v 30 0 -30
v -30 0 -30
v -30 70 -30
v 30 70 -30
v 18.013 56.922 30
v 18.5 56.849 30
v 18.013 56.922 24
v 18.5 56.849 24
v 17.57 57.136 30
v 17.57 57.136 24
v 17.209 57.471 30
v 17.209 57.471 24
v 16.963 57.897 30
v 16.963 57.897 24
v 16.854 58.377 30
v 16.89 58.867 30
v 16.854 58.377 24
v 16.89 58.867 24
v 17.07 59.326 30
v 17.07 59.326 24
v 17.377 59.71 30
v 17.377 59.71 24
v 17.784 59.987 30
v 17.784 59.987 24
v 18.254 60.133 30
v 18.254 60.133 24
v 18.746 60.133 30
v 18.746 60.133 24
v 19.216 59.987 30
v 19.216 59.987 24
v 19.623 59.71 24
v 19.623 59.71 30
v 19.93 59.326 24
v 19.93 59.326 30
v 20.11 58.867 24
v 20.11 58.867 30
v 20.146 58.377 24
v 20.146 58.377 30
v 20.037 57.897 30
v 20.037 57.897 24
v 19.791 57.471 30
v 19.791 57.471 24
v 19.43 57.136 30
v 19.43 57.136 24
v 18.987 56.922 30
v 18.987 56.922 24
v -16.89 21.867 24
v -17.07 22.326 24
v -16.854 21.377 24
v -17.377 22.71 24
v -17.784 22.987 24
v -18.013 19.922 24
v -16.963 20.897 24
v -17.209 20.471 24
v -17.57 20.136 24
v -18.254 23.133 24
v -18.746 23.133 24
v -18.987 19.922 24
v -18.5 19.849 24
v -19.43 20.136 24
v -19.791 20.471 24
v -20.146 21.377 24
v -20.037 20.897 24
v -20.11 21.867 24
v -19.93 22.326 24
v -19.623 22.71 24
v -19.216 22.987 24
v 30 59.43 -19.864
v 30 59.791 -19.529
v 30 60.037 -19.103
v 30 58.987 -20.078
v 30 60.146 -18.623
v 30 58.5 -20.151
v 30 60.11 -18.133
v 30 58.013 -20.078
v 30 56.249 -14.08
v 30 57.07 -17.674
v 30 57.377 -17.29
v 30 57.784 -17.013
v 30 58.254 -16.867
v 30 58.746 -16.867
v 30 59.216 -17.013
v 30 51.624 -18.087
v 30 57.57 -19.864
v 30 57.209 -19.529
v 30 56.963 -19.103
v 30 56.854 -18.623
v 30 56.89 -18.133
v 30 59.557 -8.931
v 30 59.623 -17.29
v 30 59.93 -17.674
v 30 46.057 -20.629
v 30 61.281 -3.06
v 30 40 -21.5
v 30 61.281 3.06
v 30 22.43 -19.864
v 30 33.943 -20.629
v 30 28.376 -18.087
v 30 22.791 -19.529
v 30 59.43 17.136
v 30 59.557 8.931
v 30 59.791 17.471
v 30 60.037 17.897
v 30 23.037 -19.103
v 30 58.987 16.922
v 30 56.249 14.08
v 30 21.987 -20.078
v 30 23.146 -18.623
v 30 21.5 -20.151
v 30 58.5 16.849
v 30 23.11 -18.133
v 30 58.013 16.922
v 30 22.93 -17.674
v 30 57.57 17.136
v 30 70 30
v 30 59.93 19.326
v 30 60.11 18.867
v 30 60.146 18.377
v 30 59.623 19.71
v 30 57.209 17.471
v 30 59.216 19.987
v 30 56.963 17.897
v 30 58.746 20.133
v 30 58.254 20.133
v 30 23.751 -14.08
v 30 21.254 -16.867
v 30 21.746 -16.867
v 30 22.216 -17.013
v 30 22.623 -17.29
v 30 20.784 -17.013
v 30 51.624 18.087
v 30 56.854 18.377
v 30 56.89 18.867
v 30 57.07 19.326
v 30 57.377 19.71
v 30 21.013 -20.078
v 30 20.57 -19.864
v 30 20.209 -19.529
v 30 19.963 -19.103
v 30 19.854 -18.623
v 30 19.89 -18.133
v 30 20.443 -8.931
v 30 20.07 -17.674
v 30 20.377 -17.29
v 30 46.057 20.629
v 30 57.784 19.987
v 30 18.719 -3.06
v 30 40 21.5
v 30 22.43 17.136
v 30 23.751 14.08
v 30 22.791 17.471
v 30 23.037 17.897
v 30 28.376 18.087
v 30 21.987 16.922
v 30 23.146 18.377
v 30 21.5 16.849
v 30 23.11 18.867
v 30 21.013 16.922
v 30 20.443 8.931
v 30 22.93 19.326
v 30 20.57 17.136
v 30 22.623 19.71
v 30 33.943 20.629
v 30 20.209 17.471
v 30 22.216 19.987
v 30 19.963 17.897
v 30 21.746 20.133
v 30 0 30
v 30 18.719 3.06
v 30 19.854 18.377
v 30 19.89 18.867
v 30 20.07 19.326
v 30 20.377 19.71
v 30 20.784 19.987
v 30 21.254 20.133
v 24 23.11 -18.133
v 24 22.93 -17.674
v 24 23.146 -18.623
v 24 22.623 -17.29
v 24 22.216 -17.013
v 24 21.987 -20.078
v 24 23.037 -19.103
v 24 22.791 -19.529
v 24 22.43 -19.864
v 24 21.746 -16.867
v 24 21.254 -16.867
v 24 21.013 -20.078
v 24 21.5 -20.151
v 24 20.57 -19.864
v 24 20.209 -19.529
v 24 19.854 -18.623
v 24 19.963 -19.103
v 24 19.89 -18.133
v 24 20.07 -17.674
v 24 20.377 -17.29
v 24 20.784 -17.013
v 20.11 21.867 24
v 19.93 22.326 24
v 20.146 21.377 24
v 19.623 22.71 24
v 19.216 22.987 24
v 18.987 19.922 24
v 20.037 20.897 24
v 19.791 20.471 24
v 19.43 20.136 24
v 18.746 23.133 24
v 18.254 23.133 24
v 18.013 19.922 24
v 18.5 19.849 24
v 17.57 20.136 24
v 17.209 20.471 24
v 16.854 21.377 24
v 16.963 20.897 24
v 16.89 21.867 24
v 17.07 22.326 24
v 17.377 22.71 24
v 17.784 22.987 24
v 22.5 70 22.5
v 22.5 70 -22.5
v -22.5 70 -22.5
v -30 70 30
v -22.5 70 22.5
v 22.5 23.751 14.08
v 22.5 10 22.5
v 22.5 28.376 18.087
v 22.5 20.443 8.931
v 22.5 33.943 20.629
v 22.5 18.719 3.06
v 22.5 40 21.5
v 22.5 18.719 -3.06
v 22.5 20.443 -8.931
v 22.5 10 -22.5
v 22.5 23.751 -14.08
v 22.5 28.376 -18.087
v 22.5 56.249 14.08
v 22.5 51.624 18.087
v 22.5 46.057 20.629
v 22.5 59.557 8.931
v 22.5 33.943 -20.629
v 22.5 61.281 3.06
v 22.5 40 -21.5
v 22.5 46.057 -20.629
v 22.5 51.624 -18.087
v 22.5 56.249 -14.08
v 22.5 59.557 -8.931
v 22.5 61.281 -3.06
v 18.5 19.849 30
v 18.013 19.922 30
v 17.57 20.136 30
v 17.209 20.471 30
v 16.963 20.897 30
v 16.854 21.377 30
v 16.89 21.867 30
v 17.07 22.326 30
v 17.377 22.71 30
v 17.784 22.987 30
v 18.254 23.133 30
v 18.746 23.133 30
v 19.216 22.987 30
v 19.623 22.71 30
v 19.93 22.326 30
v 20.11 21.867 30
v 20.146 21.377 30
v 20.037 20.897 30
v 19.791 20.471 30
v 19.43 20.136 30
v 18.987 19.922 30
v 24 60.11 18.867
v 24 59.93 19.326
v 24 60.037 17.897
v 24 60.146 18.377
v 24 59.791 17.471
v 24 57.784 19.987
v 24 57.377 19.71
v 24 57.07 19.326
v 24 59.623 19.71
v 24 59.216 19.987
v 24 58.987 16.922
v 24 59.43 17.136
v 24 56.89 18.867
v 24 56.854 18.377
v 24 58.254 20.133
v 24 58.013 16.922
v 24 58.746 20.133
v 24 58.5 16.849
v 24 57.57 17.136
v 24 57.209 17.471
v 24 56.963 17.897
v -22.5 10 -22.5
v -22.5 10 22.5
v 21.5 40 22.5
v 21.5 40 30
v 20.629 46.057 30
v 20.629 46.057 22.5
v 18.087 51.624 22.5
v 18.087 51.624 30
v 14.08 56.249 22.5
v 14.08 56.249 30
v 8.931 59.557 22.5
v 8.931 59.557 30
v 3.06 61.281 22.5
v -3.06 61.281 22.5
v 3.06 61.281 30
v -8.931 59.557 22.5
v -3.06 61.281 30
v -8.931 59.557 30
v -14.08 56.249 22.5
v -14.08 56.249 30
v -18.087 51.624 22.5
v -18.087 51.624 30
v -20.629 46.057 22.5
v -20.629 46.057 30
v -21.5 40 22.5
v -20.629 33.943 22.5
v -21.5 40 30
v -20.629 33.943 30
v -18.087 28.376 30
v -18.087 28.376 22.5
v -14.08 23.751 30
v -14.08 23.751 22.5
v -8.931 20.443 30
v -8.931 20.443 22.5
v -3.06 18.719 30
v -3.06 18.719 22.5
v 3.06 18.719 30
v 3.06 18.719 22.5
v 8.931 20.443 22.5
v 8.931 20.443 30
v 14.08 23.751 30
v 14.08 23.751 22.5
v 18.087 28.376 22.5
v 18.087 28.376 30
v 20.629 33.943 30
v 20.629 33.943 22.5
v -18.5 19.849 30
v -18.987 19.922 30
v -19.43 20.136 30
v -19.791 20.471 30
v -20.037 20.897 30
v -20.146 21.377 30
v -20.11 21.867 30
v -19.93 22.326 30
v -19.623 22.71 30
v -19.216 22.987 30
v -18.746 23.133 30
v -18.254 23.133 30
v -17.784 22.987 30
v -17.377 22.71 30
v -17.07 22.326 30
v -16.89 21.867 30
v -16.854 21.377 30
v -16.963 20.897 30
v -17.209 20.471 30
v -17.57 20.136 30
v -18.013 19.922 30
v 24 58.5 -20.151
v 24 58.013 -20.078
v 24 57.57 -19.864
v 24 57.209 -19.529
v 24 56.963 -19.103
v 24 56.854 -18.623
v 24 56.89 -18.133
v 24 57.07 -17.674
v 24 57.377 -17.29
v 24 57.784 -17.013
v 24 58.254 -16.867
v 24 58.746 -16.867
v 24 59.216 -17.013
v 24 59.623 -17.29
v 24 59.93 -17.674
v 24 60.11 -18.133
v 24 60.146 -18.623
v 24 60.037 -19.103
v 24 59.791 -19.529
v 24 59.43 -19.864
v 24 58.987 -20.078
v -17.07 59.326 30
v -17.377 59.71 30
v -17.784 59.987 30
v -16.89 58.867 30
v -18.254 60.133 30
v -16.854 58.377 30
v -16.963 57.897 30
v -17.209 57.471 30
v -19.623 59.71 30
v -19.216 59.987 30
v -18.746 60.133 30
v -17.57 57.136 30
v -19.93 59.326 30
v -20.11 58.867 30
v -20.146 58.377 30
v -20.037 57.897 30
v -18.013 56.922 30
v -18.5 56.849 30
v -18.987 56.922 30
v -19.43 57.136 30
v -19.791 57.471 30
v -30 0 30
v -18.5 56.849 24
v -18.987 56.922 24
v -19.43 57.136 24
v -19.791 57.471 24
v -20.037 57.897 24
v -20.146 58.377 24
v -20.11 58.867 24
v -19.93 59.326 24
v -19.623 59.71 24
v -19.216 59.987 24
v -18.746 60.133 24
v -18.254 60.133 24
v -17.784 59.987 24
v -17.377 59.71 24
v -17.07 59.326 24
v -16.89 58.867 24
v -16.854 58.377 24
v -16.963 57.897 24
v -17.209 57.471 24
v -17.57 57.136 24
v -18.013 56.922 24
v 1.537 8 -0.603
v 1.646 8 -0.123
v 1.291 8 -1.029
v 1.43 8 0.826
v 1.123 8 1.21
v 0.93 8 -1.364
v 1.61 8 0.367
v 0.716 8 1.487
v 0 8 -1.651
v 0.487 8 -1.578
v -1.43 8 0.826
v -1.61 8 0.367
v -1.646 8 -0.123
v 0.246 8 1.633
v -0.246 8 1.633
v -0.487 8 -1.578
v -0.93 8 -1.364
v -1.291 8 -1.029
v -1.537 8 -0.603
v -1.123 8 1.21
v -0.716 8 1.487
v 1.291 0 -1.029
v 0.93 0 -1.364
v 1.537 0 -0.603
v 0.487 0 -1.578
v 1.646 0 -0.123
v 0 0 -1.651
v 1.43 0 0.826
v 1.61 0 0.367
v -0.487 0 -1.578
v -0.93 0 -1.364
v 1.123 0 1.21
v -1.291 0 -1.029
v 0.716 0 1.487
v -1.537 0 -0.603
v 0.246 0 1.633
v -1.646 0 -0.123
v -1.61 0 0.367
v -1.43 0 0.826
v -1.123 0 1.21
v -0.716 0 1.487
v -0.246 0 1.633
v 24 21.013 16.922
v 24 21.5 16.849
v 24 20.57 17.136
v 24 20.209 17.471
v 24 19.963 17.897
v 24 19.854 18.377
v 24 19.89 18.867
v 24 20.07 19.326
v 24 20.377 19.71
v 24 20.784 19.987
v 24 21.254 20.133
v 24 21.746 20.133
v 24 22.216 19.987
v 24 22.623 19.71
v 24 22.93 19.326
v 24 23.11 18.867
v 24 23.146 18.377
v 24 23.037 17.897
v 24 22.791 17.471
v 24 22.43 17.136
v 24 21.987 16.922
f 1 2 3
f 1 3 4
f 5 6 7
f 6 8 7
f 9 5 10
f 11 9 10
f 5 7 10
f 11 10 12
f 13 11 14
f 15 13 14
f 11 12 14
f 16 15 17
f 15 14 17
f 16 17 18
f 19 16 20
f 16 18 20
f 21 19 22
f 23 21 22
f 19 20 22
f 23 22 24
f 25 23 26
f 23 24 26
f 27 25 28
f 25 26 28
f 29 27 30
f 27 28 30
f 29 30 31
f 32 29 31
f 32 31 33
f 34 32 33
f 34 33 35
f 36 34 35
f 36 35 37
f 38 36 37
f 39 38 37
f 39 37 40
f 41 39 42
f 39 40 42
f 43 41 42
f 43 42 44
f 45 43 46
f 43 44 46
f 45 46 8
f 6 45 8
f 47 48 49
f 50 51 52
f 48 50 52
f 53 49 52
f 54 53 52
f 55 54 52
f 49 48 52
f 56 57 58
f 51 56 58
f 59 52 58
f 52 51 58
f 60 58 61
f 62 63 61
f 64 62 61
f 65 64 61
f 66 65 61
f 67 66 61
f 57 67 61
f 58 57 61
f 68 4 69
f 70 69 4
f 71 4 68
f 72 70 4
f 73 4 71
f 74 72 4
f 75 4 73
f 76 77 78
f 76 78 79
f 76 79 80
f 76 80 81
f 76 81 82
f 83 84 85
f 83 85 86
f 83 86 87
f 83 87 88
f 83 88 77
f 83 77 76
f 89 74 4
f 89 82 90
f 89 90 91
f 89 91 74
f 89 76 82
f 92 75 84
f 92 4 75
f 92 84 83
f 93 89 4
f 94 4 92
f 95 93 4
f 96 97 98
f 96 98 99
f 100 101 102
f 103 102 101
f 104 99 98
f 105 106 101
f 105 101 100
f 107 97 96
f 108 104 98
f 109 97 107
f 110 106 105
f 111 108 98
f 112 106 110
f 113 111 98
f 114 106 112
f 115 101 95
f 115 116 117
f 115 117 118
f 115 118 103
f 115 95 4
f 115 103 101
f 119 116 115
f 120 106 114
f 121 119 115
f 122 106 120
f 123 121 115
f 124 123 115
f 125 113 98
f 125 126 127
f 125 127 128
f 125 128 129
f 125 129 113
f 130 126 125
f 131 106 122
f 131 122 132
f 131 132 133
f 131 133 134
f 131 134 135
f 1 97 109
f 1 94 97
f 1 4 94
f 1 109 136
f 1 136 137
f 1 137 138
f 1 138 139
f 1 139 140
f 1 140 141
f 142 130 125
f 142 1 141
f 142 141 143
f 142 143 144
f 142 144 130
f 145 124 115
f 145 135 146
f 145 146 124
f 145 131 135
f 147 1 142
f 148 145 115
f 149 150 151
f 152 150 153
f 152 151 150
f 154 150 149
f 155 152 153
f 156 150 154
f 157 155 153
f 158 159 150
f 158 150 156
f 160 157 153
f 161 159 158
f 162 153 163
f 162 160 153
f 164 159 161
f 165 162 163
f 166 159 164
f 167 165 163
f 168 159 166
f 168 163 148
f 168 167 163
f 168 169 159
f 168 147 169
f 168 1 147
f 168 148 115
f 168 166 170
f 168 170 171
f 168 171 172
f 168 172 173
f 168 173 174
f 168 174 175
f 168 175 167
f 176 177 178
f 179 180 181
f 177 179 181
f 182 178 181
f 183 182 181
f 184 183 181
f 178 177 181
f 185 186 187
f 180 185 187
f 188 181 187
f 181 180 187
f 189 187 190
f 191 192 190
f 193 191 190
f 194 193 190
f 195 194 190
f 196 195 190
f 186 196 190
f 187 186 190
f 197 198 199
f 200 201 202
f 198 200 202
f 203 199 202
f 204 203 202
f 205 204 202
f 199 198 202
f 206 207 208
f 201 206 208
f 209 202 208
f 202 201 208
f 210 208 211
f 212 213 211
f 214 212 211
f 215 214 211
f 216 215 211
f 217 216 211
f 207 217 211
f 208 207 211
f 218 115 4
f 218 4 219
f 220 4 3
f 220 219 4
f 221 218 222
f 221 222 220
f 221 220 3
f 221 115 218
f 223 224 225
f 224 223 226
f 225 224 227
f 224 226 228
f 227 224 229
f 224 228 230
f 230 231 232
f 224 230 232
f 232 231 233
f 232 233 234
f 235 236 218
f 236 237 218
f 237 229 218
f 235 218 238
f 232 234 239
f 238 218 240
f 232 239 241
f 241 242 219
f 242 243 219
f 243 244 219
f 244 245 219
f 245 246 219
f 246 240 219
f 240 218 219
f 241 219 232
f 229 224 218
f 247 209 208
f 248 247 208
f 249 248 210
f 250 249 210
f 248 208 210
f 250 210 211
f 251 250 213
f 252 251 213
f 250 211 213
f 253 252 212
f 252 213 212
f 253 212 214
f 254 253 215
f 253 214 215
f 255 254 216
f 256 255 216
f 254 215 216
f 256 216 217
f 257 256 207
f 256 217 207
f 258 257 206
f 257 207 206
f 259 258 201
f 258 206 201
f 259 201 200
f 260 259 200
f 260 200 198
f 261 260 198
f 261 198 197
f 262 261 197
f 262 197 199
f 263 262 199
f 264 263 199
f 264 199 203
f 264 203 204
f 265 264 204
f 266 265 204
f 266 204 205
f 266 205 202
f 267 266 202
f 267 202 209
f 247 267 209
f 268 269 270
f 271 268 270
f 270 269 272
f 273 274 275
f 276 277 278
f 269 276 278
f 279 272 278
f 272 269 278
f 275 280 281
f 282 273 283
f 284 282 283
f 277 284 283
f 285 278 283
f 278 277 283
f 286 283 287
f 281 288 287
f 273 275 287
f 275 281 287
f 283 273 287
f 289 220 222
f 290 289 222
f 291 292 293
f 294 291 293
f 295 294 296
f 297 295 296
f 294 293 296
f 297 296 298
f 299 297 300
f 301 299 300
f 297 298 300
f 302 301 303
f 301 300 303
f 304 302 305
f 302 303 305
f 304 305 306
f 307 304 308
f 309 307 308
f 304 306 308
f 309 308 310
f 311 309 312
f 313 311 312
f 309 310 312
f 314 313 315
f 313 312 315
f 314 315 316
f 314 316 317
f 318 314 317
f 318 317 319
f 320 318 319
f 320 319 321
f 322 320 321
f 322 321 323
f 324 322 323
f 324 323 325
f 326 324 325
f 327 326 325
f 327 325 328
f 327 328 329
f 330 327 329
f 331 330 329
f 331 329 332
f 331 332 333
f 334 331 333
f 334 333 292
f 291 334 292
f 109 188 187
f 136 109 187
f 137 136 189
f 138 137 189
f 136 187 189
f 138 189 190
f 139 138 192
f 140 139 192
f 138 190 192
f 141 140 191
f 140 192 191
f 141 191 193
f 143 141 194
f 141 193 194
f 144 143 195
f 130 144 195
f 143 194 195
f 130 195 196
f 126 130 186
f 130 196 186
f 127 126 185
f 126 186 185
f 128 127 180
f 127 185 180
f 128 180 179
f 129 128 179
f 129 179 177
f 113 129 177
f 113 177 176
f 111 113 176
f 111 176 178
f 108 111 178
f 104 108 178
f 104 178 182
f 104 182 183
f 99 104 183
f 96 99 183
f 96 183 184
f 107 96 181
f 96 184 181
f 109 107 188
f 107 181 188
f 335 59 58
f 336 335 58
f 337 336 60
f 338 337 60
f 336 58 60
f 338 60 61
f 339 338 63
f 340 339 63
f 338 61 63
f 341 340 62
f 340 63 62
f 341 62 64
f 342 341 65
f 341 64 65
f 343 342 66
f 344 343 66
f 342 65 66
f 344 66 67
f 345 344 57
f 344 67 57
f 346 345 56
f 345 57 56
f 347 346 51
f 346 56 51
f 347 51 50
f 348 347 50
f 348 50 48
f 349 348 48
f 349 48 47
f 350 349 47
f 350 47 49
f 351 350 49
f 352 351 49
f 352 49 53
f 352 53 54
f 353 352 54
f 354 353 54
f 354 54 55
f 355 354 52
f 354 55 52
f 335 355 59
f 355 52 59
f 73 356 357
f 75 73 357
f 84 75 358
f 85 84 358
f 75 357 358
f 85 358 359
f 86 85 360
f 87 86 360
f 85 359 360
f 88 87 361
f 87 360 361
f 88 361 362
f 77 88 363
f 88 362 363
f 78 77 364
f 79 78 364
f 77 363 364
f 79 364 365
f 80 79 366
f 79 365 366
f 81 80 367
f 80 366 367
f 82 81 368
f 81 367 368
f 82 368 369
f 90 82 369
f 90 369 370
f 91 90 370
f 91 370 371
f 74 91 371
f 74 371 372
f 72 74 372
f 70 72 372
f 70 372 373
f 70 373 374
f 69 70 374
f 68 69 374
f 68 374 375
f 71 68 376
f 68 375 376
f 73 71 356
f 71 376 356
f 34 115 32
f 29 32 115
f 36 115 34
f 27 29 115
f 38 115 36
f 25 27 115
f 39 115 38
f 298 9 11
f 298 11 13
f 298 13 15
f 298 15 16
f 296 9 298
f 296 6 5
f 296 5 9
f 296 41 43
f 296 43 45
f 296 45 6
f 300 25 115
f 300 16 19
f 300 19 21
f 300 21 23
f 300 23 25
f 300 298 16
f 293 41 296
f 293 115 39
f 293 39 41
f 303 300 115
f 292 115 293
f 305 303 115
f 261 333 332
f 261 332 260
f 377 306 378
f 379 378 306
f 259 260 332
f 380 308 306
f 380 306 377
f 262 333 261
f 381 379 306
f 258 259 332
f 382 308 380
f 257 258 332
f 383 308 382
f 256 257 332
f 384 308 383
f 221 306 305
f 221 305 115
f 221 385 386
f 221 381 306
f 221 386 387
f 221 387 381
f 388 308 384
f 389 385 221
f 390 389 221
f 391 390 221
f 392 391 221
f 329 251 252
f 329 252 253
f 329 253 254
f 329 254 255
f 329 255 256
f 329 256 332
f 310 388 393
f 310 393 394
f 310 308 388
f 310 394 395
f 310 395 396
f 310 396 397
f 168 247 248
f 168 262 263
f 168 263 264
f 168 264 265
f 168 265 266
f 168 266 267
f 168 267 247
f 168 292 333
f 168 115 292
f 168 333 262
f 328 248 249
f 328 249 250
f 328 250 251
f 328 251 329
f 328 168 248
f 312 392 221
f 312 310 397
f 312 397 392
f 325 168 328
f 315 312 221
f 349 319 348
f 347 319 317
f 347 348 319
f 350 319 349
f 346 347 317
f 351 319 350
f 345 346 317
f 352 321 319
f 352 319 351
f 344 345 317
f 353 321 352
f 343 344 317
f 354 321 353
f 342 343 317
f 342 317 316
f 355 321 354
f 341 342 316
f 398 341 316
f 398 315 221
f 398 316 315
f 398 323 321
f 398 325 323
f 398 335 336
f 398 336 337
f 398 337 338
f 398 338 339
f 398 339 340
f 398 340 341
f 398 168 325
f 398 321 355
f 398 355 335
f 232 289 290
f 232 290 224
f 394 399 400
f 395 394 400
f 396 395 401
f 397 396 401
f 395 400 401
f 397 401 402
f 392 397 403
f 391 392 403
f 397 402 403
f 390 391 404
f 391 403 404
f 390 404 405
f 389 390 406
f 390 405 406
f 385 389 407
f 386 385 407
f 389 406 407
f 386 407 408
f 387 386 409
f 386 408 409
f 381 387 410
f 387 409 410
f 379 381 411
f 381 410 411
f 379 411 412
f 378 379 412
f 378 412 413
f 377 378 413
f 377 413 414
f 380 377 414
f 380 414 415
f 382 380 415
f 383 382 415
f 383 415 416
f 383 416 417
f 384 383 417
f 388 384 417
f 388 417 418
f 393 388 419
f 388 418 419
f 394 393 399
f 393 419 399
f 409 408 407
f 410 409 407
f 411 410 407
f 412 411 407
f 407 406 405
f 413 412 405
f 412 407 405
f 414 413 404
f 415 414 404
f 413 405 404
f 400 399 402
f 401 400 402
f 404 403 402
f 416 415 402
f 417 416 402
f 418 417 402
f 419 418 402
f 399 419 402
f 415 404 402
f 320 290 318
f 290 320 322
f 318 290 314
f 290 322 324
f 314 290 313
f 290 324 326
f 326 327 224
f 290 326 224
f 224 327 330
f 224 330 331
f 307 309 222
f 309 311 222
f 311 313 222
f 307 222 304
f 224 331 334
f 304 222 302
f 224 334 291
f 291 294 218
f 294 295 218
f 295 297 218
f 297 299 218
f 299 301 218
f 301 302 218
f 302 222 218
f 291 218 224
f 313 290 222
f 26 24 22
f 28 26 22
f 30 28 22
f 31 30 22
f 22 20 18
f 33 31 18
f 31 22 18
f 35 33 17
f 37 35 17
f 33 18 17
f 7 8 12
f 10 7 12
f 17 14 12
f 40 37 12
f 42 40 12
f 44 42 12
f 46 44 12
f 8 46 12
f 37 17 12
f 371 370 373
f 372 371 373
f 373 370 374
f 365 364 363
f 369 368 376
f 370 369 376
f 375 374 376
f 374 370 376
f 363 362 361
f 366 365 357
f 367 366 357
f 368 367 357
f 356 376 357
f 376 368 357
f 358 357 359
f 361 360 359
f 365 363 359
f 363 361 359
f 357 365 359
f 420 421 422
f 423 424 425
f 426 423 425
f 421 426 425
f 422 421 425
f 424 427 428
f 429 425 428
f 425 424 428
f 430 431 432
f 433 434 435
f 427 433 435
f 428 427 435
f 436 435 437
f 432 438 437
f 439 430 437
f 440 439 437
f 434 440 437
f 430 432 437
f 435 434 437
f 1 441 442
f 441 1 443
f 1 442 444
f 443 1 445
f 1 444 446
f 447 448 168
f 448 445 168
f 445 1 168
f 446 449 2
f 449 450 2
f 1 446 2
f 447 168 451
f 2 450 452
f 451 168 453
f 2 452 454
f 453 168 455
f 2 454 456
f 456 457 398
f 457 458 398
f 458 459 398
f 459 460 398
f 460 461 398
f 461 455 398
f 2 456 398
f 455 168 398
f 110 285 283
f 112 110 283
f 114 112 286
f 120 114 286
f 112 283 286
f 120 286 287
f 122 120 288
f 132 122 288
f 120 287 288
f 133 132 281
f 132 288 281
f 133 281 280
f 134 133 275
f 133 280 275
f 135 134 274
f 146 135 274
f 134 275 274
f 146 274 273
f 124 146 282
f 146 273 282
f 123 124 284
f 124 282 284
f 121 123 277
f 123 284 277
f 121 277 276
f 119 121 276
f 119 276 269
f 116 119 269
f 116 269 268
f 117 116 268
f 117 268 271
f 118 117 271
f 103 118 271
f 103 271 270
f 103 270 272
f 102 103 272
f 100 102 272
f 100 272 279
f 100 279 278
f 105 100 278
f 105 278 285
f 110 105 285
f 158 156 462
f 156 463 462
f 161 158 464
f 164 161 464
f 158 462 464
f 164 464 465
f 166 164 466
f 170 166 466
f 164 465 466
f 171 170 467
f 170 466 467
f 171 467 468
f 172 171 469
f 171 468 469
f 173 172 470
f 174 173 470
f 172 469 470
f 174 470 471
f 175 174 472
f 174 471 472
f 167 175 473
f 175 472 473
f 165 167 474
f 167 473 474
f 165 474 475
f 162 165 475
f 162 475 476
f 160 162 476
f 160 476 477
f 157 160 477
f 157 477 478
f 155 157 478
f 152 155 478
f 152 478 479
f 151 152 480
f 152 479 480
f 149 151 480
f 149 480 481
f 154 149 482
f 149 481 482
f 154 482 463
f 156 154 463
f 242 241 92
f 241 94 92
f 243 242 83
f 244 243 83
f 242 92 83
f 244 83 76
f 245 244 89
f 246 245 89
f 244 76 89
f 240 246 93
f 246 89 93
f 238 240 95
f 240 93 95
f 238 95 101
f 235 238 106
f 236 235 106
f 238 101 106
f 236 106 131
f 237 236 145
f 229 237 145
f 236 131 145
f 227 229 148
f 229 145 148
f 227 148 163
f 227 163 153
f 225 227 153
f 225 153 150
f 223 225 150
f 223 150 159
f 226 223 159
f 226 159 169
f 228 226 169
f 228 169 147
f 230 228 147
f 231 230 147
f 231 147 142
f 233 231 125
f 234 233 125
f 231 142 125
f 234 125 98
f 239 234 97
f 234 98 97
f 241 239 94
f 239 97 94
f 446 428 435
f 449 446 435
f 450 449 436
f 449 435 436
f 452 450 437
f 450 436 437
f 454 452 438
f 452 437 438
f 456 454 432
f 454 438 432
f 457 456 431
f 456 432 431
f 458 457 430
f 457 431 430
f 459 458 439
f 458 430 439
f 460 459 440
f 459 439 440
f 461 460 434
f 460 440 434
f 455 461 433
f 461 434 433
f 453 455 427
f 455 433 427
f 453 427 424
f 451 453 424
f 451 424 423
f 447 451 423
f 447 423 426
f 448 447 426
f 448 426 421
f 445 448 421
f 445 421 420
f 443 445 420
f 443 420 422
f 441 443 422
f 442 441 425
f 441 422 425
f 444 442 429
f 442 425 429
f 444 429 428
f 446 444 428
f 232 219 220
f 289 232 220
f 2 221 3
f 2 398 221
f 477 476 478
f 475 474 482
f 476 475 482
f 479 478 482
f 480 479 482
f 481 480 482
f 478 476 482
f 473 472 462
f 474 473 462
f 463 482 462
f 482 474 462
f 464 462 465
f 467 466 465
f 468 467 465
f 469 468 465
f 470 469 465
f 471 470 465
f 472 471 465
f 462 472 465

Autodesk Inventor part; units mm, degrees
ref_plane "YZ Plane" through (0, 0, 0) normal (1, 0, 0) x (0, 1, 0)
ref_plane "XZ Plane" through (0, 0, 0) normal (0, 1, 0) x (-1, 0, 0)
ref_plane "XY Plane" through (0, 0, 0) normal (0, 0, 1) x (1, 0, 0)
sketch "Sketch1" plane through (0, 0, 0) normal (0, 1, 0) x (-1, 0, 0)
  line L0 (-30, 30) -> (30, 30)
  line L1 (30, 30) -> (30, -30)
  line L2 (30, -30) -> (-30, -30)
  line L3 (-30, -30) -> (-30, 30)
  line L4 (-30, 30) -> (30, -30) construction
  line L5 (30, 30) -> (-30, -30) construction
  point P0 (0, 0)
  dimension "d0" = 60
  dimension "d1" = 60
extrude "Extrusion1" add sketch "Sketch1" along normal blind 70
sketch "Sketch2" plane through (0, 70, 0) normal (0, 1, 0) x (1, 0, 0)
  line L0 (22.5, 22.5) -> (-22.5, 22.5)
  line L1 (-22.5, 22.5) -> (-22.5, -22.5)
  line L2 (-22.5, -22.5) -> (22.5, -22.5)
  line L3 (22.5, -22.5) -> (22.5, 22.5)
  line L4 (22.5, 22.5) -> (-22.5, -22.5) construction
  line L5 (-22.5, 22.5) -> (22.5, -22.5) construction
  point P0 (0, 0)
  dimension "d4" = 45
  dimension "d5" = 45
extrude "Extrusion2" cut sketch "Sketch2" against normal blind 60
sketch "Sketch3" plane through (-30, 0, 30) normal (0, 0, 1) x (1, 0, 0)
  circle A0 centre (30, 40) radius 21.5
  point P0 (30, 0)
  dimension "d8" = 43
extrude "Extrusion3" cut sketch "Sketch3" against normal blind 15
sketch "Sketch4" plane through (30, 0, 30) normal (1, 0, 0) x (0, 0, -1)
  circle A0 centre (30, 40) radius 21.5
  point P0 (30, 0)
  dimension "d11" = 43
extrude "Extrusion4" cut sketch "Sketch4" against normal blind 15
sketch "Sketch5" plane through (0, 0, 0) normal (0, -1, 0) x (1, 0, 0)
  point P0 (0, 0)
  point P1 (0, 0)
hole "Hole1" at (0, 0, 0) direction (0, 1, 0) diameter 3.302 depth 8 thread size "8-32 UNC" class "2B" standard "ANSI Unified Screw Threads"
sketch "Sketch7" plane through (-30, 0, 30) normal (0, 0, 1) x (1, 0, 0)
  line L0 (11.5, 21.5) -> (48.5, 21.5)
  line L1 (48.5, 21.5) -> (48.5, 58.5)
  line L2 (48.5, 58.5) -> (11.5, 58.5)
  line L3 (11.5, 58.5) -> (11.5, 21.5)
  line L4 (11.5, 21.5) -> (48.5, 58.5) construction
  line L5 (48.5, 21.5) -> (11.5, 58.5) construction
  point P0 (30, 0)
  point P1 (30, 40)
  dimension "d21" = 37
  dimension "d22" = 37
hole "Hole2" at (-18.5, 58.5, 30) at (18.5, 58.5, 30) at (18.5, 21.5, 30) at (-18.5, 21.5, 30) direction (0, 0, -1) diameter 3.302 depth 6 thread size "8-32 UNC" class "2B" standard "ANSI Unified Screw Threads"
sketch "Sketch8" plane through (30, 0, 30) normal (1, 0, 0) x (0, 0, -1)
  line L0 (11.5, 21.5) -> (48.5, 21.5)
  line L1 (48.5, 21.5) -> (48.5, 58.5)
  line L2 (48.5, 58.5) -> (11.5, 58.5)
  line L3 (11.5, 58.5) -> (11.5, 21.5)
  line L4 (11.5, 21.5) -> (48.5, 58.5) construction
  line L5 (48.5, 21.5) -> (11.5, 58.5) construction
  point P0 (30, 0)
  point P1 (30, 40)
  dimension "d30" = 37
  dimension "d31" = 37
hole "Hole3" at (30, 58.5, 18.5) at (30, 58.5, -18.5) at (30, 21.5, 18.5) at (30, 21.5, -18.5) direction (-1, 0, 0) diameter 3.302 depth 6 thread size "8-32 UNC" class "2B" standard "ANSI Unified Screw Threads"
properties part number "immersion_chamber_bath"
